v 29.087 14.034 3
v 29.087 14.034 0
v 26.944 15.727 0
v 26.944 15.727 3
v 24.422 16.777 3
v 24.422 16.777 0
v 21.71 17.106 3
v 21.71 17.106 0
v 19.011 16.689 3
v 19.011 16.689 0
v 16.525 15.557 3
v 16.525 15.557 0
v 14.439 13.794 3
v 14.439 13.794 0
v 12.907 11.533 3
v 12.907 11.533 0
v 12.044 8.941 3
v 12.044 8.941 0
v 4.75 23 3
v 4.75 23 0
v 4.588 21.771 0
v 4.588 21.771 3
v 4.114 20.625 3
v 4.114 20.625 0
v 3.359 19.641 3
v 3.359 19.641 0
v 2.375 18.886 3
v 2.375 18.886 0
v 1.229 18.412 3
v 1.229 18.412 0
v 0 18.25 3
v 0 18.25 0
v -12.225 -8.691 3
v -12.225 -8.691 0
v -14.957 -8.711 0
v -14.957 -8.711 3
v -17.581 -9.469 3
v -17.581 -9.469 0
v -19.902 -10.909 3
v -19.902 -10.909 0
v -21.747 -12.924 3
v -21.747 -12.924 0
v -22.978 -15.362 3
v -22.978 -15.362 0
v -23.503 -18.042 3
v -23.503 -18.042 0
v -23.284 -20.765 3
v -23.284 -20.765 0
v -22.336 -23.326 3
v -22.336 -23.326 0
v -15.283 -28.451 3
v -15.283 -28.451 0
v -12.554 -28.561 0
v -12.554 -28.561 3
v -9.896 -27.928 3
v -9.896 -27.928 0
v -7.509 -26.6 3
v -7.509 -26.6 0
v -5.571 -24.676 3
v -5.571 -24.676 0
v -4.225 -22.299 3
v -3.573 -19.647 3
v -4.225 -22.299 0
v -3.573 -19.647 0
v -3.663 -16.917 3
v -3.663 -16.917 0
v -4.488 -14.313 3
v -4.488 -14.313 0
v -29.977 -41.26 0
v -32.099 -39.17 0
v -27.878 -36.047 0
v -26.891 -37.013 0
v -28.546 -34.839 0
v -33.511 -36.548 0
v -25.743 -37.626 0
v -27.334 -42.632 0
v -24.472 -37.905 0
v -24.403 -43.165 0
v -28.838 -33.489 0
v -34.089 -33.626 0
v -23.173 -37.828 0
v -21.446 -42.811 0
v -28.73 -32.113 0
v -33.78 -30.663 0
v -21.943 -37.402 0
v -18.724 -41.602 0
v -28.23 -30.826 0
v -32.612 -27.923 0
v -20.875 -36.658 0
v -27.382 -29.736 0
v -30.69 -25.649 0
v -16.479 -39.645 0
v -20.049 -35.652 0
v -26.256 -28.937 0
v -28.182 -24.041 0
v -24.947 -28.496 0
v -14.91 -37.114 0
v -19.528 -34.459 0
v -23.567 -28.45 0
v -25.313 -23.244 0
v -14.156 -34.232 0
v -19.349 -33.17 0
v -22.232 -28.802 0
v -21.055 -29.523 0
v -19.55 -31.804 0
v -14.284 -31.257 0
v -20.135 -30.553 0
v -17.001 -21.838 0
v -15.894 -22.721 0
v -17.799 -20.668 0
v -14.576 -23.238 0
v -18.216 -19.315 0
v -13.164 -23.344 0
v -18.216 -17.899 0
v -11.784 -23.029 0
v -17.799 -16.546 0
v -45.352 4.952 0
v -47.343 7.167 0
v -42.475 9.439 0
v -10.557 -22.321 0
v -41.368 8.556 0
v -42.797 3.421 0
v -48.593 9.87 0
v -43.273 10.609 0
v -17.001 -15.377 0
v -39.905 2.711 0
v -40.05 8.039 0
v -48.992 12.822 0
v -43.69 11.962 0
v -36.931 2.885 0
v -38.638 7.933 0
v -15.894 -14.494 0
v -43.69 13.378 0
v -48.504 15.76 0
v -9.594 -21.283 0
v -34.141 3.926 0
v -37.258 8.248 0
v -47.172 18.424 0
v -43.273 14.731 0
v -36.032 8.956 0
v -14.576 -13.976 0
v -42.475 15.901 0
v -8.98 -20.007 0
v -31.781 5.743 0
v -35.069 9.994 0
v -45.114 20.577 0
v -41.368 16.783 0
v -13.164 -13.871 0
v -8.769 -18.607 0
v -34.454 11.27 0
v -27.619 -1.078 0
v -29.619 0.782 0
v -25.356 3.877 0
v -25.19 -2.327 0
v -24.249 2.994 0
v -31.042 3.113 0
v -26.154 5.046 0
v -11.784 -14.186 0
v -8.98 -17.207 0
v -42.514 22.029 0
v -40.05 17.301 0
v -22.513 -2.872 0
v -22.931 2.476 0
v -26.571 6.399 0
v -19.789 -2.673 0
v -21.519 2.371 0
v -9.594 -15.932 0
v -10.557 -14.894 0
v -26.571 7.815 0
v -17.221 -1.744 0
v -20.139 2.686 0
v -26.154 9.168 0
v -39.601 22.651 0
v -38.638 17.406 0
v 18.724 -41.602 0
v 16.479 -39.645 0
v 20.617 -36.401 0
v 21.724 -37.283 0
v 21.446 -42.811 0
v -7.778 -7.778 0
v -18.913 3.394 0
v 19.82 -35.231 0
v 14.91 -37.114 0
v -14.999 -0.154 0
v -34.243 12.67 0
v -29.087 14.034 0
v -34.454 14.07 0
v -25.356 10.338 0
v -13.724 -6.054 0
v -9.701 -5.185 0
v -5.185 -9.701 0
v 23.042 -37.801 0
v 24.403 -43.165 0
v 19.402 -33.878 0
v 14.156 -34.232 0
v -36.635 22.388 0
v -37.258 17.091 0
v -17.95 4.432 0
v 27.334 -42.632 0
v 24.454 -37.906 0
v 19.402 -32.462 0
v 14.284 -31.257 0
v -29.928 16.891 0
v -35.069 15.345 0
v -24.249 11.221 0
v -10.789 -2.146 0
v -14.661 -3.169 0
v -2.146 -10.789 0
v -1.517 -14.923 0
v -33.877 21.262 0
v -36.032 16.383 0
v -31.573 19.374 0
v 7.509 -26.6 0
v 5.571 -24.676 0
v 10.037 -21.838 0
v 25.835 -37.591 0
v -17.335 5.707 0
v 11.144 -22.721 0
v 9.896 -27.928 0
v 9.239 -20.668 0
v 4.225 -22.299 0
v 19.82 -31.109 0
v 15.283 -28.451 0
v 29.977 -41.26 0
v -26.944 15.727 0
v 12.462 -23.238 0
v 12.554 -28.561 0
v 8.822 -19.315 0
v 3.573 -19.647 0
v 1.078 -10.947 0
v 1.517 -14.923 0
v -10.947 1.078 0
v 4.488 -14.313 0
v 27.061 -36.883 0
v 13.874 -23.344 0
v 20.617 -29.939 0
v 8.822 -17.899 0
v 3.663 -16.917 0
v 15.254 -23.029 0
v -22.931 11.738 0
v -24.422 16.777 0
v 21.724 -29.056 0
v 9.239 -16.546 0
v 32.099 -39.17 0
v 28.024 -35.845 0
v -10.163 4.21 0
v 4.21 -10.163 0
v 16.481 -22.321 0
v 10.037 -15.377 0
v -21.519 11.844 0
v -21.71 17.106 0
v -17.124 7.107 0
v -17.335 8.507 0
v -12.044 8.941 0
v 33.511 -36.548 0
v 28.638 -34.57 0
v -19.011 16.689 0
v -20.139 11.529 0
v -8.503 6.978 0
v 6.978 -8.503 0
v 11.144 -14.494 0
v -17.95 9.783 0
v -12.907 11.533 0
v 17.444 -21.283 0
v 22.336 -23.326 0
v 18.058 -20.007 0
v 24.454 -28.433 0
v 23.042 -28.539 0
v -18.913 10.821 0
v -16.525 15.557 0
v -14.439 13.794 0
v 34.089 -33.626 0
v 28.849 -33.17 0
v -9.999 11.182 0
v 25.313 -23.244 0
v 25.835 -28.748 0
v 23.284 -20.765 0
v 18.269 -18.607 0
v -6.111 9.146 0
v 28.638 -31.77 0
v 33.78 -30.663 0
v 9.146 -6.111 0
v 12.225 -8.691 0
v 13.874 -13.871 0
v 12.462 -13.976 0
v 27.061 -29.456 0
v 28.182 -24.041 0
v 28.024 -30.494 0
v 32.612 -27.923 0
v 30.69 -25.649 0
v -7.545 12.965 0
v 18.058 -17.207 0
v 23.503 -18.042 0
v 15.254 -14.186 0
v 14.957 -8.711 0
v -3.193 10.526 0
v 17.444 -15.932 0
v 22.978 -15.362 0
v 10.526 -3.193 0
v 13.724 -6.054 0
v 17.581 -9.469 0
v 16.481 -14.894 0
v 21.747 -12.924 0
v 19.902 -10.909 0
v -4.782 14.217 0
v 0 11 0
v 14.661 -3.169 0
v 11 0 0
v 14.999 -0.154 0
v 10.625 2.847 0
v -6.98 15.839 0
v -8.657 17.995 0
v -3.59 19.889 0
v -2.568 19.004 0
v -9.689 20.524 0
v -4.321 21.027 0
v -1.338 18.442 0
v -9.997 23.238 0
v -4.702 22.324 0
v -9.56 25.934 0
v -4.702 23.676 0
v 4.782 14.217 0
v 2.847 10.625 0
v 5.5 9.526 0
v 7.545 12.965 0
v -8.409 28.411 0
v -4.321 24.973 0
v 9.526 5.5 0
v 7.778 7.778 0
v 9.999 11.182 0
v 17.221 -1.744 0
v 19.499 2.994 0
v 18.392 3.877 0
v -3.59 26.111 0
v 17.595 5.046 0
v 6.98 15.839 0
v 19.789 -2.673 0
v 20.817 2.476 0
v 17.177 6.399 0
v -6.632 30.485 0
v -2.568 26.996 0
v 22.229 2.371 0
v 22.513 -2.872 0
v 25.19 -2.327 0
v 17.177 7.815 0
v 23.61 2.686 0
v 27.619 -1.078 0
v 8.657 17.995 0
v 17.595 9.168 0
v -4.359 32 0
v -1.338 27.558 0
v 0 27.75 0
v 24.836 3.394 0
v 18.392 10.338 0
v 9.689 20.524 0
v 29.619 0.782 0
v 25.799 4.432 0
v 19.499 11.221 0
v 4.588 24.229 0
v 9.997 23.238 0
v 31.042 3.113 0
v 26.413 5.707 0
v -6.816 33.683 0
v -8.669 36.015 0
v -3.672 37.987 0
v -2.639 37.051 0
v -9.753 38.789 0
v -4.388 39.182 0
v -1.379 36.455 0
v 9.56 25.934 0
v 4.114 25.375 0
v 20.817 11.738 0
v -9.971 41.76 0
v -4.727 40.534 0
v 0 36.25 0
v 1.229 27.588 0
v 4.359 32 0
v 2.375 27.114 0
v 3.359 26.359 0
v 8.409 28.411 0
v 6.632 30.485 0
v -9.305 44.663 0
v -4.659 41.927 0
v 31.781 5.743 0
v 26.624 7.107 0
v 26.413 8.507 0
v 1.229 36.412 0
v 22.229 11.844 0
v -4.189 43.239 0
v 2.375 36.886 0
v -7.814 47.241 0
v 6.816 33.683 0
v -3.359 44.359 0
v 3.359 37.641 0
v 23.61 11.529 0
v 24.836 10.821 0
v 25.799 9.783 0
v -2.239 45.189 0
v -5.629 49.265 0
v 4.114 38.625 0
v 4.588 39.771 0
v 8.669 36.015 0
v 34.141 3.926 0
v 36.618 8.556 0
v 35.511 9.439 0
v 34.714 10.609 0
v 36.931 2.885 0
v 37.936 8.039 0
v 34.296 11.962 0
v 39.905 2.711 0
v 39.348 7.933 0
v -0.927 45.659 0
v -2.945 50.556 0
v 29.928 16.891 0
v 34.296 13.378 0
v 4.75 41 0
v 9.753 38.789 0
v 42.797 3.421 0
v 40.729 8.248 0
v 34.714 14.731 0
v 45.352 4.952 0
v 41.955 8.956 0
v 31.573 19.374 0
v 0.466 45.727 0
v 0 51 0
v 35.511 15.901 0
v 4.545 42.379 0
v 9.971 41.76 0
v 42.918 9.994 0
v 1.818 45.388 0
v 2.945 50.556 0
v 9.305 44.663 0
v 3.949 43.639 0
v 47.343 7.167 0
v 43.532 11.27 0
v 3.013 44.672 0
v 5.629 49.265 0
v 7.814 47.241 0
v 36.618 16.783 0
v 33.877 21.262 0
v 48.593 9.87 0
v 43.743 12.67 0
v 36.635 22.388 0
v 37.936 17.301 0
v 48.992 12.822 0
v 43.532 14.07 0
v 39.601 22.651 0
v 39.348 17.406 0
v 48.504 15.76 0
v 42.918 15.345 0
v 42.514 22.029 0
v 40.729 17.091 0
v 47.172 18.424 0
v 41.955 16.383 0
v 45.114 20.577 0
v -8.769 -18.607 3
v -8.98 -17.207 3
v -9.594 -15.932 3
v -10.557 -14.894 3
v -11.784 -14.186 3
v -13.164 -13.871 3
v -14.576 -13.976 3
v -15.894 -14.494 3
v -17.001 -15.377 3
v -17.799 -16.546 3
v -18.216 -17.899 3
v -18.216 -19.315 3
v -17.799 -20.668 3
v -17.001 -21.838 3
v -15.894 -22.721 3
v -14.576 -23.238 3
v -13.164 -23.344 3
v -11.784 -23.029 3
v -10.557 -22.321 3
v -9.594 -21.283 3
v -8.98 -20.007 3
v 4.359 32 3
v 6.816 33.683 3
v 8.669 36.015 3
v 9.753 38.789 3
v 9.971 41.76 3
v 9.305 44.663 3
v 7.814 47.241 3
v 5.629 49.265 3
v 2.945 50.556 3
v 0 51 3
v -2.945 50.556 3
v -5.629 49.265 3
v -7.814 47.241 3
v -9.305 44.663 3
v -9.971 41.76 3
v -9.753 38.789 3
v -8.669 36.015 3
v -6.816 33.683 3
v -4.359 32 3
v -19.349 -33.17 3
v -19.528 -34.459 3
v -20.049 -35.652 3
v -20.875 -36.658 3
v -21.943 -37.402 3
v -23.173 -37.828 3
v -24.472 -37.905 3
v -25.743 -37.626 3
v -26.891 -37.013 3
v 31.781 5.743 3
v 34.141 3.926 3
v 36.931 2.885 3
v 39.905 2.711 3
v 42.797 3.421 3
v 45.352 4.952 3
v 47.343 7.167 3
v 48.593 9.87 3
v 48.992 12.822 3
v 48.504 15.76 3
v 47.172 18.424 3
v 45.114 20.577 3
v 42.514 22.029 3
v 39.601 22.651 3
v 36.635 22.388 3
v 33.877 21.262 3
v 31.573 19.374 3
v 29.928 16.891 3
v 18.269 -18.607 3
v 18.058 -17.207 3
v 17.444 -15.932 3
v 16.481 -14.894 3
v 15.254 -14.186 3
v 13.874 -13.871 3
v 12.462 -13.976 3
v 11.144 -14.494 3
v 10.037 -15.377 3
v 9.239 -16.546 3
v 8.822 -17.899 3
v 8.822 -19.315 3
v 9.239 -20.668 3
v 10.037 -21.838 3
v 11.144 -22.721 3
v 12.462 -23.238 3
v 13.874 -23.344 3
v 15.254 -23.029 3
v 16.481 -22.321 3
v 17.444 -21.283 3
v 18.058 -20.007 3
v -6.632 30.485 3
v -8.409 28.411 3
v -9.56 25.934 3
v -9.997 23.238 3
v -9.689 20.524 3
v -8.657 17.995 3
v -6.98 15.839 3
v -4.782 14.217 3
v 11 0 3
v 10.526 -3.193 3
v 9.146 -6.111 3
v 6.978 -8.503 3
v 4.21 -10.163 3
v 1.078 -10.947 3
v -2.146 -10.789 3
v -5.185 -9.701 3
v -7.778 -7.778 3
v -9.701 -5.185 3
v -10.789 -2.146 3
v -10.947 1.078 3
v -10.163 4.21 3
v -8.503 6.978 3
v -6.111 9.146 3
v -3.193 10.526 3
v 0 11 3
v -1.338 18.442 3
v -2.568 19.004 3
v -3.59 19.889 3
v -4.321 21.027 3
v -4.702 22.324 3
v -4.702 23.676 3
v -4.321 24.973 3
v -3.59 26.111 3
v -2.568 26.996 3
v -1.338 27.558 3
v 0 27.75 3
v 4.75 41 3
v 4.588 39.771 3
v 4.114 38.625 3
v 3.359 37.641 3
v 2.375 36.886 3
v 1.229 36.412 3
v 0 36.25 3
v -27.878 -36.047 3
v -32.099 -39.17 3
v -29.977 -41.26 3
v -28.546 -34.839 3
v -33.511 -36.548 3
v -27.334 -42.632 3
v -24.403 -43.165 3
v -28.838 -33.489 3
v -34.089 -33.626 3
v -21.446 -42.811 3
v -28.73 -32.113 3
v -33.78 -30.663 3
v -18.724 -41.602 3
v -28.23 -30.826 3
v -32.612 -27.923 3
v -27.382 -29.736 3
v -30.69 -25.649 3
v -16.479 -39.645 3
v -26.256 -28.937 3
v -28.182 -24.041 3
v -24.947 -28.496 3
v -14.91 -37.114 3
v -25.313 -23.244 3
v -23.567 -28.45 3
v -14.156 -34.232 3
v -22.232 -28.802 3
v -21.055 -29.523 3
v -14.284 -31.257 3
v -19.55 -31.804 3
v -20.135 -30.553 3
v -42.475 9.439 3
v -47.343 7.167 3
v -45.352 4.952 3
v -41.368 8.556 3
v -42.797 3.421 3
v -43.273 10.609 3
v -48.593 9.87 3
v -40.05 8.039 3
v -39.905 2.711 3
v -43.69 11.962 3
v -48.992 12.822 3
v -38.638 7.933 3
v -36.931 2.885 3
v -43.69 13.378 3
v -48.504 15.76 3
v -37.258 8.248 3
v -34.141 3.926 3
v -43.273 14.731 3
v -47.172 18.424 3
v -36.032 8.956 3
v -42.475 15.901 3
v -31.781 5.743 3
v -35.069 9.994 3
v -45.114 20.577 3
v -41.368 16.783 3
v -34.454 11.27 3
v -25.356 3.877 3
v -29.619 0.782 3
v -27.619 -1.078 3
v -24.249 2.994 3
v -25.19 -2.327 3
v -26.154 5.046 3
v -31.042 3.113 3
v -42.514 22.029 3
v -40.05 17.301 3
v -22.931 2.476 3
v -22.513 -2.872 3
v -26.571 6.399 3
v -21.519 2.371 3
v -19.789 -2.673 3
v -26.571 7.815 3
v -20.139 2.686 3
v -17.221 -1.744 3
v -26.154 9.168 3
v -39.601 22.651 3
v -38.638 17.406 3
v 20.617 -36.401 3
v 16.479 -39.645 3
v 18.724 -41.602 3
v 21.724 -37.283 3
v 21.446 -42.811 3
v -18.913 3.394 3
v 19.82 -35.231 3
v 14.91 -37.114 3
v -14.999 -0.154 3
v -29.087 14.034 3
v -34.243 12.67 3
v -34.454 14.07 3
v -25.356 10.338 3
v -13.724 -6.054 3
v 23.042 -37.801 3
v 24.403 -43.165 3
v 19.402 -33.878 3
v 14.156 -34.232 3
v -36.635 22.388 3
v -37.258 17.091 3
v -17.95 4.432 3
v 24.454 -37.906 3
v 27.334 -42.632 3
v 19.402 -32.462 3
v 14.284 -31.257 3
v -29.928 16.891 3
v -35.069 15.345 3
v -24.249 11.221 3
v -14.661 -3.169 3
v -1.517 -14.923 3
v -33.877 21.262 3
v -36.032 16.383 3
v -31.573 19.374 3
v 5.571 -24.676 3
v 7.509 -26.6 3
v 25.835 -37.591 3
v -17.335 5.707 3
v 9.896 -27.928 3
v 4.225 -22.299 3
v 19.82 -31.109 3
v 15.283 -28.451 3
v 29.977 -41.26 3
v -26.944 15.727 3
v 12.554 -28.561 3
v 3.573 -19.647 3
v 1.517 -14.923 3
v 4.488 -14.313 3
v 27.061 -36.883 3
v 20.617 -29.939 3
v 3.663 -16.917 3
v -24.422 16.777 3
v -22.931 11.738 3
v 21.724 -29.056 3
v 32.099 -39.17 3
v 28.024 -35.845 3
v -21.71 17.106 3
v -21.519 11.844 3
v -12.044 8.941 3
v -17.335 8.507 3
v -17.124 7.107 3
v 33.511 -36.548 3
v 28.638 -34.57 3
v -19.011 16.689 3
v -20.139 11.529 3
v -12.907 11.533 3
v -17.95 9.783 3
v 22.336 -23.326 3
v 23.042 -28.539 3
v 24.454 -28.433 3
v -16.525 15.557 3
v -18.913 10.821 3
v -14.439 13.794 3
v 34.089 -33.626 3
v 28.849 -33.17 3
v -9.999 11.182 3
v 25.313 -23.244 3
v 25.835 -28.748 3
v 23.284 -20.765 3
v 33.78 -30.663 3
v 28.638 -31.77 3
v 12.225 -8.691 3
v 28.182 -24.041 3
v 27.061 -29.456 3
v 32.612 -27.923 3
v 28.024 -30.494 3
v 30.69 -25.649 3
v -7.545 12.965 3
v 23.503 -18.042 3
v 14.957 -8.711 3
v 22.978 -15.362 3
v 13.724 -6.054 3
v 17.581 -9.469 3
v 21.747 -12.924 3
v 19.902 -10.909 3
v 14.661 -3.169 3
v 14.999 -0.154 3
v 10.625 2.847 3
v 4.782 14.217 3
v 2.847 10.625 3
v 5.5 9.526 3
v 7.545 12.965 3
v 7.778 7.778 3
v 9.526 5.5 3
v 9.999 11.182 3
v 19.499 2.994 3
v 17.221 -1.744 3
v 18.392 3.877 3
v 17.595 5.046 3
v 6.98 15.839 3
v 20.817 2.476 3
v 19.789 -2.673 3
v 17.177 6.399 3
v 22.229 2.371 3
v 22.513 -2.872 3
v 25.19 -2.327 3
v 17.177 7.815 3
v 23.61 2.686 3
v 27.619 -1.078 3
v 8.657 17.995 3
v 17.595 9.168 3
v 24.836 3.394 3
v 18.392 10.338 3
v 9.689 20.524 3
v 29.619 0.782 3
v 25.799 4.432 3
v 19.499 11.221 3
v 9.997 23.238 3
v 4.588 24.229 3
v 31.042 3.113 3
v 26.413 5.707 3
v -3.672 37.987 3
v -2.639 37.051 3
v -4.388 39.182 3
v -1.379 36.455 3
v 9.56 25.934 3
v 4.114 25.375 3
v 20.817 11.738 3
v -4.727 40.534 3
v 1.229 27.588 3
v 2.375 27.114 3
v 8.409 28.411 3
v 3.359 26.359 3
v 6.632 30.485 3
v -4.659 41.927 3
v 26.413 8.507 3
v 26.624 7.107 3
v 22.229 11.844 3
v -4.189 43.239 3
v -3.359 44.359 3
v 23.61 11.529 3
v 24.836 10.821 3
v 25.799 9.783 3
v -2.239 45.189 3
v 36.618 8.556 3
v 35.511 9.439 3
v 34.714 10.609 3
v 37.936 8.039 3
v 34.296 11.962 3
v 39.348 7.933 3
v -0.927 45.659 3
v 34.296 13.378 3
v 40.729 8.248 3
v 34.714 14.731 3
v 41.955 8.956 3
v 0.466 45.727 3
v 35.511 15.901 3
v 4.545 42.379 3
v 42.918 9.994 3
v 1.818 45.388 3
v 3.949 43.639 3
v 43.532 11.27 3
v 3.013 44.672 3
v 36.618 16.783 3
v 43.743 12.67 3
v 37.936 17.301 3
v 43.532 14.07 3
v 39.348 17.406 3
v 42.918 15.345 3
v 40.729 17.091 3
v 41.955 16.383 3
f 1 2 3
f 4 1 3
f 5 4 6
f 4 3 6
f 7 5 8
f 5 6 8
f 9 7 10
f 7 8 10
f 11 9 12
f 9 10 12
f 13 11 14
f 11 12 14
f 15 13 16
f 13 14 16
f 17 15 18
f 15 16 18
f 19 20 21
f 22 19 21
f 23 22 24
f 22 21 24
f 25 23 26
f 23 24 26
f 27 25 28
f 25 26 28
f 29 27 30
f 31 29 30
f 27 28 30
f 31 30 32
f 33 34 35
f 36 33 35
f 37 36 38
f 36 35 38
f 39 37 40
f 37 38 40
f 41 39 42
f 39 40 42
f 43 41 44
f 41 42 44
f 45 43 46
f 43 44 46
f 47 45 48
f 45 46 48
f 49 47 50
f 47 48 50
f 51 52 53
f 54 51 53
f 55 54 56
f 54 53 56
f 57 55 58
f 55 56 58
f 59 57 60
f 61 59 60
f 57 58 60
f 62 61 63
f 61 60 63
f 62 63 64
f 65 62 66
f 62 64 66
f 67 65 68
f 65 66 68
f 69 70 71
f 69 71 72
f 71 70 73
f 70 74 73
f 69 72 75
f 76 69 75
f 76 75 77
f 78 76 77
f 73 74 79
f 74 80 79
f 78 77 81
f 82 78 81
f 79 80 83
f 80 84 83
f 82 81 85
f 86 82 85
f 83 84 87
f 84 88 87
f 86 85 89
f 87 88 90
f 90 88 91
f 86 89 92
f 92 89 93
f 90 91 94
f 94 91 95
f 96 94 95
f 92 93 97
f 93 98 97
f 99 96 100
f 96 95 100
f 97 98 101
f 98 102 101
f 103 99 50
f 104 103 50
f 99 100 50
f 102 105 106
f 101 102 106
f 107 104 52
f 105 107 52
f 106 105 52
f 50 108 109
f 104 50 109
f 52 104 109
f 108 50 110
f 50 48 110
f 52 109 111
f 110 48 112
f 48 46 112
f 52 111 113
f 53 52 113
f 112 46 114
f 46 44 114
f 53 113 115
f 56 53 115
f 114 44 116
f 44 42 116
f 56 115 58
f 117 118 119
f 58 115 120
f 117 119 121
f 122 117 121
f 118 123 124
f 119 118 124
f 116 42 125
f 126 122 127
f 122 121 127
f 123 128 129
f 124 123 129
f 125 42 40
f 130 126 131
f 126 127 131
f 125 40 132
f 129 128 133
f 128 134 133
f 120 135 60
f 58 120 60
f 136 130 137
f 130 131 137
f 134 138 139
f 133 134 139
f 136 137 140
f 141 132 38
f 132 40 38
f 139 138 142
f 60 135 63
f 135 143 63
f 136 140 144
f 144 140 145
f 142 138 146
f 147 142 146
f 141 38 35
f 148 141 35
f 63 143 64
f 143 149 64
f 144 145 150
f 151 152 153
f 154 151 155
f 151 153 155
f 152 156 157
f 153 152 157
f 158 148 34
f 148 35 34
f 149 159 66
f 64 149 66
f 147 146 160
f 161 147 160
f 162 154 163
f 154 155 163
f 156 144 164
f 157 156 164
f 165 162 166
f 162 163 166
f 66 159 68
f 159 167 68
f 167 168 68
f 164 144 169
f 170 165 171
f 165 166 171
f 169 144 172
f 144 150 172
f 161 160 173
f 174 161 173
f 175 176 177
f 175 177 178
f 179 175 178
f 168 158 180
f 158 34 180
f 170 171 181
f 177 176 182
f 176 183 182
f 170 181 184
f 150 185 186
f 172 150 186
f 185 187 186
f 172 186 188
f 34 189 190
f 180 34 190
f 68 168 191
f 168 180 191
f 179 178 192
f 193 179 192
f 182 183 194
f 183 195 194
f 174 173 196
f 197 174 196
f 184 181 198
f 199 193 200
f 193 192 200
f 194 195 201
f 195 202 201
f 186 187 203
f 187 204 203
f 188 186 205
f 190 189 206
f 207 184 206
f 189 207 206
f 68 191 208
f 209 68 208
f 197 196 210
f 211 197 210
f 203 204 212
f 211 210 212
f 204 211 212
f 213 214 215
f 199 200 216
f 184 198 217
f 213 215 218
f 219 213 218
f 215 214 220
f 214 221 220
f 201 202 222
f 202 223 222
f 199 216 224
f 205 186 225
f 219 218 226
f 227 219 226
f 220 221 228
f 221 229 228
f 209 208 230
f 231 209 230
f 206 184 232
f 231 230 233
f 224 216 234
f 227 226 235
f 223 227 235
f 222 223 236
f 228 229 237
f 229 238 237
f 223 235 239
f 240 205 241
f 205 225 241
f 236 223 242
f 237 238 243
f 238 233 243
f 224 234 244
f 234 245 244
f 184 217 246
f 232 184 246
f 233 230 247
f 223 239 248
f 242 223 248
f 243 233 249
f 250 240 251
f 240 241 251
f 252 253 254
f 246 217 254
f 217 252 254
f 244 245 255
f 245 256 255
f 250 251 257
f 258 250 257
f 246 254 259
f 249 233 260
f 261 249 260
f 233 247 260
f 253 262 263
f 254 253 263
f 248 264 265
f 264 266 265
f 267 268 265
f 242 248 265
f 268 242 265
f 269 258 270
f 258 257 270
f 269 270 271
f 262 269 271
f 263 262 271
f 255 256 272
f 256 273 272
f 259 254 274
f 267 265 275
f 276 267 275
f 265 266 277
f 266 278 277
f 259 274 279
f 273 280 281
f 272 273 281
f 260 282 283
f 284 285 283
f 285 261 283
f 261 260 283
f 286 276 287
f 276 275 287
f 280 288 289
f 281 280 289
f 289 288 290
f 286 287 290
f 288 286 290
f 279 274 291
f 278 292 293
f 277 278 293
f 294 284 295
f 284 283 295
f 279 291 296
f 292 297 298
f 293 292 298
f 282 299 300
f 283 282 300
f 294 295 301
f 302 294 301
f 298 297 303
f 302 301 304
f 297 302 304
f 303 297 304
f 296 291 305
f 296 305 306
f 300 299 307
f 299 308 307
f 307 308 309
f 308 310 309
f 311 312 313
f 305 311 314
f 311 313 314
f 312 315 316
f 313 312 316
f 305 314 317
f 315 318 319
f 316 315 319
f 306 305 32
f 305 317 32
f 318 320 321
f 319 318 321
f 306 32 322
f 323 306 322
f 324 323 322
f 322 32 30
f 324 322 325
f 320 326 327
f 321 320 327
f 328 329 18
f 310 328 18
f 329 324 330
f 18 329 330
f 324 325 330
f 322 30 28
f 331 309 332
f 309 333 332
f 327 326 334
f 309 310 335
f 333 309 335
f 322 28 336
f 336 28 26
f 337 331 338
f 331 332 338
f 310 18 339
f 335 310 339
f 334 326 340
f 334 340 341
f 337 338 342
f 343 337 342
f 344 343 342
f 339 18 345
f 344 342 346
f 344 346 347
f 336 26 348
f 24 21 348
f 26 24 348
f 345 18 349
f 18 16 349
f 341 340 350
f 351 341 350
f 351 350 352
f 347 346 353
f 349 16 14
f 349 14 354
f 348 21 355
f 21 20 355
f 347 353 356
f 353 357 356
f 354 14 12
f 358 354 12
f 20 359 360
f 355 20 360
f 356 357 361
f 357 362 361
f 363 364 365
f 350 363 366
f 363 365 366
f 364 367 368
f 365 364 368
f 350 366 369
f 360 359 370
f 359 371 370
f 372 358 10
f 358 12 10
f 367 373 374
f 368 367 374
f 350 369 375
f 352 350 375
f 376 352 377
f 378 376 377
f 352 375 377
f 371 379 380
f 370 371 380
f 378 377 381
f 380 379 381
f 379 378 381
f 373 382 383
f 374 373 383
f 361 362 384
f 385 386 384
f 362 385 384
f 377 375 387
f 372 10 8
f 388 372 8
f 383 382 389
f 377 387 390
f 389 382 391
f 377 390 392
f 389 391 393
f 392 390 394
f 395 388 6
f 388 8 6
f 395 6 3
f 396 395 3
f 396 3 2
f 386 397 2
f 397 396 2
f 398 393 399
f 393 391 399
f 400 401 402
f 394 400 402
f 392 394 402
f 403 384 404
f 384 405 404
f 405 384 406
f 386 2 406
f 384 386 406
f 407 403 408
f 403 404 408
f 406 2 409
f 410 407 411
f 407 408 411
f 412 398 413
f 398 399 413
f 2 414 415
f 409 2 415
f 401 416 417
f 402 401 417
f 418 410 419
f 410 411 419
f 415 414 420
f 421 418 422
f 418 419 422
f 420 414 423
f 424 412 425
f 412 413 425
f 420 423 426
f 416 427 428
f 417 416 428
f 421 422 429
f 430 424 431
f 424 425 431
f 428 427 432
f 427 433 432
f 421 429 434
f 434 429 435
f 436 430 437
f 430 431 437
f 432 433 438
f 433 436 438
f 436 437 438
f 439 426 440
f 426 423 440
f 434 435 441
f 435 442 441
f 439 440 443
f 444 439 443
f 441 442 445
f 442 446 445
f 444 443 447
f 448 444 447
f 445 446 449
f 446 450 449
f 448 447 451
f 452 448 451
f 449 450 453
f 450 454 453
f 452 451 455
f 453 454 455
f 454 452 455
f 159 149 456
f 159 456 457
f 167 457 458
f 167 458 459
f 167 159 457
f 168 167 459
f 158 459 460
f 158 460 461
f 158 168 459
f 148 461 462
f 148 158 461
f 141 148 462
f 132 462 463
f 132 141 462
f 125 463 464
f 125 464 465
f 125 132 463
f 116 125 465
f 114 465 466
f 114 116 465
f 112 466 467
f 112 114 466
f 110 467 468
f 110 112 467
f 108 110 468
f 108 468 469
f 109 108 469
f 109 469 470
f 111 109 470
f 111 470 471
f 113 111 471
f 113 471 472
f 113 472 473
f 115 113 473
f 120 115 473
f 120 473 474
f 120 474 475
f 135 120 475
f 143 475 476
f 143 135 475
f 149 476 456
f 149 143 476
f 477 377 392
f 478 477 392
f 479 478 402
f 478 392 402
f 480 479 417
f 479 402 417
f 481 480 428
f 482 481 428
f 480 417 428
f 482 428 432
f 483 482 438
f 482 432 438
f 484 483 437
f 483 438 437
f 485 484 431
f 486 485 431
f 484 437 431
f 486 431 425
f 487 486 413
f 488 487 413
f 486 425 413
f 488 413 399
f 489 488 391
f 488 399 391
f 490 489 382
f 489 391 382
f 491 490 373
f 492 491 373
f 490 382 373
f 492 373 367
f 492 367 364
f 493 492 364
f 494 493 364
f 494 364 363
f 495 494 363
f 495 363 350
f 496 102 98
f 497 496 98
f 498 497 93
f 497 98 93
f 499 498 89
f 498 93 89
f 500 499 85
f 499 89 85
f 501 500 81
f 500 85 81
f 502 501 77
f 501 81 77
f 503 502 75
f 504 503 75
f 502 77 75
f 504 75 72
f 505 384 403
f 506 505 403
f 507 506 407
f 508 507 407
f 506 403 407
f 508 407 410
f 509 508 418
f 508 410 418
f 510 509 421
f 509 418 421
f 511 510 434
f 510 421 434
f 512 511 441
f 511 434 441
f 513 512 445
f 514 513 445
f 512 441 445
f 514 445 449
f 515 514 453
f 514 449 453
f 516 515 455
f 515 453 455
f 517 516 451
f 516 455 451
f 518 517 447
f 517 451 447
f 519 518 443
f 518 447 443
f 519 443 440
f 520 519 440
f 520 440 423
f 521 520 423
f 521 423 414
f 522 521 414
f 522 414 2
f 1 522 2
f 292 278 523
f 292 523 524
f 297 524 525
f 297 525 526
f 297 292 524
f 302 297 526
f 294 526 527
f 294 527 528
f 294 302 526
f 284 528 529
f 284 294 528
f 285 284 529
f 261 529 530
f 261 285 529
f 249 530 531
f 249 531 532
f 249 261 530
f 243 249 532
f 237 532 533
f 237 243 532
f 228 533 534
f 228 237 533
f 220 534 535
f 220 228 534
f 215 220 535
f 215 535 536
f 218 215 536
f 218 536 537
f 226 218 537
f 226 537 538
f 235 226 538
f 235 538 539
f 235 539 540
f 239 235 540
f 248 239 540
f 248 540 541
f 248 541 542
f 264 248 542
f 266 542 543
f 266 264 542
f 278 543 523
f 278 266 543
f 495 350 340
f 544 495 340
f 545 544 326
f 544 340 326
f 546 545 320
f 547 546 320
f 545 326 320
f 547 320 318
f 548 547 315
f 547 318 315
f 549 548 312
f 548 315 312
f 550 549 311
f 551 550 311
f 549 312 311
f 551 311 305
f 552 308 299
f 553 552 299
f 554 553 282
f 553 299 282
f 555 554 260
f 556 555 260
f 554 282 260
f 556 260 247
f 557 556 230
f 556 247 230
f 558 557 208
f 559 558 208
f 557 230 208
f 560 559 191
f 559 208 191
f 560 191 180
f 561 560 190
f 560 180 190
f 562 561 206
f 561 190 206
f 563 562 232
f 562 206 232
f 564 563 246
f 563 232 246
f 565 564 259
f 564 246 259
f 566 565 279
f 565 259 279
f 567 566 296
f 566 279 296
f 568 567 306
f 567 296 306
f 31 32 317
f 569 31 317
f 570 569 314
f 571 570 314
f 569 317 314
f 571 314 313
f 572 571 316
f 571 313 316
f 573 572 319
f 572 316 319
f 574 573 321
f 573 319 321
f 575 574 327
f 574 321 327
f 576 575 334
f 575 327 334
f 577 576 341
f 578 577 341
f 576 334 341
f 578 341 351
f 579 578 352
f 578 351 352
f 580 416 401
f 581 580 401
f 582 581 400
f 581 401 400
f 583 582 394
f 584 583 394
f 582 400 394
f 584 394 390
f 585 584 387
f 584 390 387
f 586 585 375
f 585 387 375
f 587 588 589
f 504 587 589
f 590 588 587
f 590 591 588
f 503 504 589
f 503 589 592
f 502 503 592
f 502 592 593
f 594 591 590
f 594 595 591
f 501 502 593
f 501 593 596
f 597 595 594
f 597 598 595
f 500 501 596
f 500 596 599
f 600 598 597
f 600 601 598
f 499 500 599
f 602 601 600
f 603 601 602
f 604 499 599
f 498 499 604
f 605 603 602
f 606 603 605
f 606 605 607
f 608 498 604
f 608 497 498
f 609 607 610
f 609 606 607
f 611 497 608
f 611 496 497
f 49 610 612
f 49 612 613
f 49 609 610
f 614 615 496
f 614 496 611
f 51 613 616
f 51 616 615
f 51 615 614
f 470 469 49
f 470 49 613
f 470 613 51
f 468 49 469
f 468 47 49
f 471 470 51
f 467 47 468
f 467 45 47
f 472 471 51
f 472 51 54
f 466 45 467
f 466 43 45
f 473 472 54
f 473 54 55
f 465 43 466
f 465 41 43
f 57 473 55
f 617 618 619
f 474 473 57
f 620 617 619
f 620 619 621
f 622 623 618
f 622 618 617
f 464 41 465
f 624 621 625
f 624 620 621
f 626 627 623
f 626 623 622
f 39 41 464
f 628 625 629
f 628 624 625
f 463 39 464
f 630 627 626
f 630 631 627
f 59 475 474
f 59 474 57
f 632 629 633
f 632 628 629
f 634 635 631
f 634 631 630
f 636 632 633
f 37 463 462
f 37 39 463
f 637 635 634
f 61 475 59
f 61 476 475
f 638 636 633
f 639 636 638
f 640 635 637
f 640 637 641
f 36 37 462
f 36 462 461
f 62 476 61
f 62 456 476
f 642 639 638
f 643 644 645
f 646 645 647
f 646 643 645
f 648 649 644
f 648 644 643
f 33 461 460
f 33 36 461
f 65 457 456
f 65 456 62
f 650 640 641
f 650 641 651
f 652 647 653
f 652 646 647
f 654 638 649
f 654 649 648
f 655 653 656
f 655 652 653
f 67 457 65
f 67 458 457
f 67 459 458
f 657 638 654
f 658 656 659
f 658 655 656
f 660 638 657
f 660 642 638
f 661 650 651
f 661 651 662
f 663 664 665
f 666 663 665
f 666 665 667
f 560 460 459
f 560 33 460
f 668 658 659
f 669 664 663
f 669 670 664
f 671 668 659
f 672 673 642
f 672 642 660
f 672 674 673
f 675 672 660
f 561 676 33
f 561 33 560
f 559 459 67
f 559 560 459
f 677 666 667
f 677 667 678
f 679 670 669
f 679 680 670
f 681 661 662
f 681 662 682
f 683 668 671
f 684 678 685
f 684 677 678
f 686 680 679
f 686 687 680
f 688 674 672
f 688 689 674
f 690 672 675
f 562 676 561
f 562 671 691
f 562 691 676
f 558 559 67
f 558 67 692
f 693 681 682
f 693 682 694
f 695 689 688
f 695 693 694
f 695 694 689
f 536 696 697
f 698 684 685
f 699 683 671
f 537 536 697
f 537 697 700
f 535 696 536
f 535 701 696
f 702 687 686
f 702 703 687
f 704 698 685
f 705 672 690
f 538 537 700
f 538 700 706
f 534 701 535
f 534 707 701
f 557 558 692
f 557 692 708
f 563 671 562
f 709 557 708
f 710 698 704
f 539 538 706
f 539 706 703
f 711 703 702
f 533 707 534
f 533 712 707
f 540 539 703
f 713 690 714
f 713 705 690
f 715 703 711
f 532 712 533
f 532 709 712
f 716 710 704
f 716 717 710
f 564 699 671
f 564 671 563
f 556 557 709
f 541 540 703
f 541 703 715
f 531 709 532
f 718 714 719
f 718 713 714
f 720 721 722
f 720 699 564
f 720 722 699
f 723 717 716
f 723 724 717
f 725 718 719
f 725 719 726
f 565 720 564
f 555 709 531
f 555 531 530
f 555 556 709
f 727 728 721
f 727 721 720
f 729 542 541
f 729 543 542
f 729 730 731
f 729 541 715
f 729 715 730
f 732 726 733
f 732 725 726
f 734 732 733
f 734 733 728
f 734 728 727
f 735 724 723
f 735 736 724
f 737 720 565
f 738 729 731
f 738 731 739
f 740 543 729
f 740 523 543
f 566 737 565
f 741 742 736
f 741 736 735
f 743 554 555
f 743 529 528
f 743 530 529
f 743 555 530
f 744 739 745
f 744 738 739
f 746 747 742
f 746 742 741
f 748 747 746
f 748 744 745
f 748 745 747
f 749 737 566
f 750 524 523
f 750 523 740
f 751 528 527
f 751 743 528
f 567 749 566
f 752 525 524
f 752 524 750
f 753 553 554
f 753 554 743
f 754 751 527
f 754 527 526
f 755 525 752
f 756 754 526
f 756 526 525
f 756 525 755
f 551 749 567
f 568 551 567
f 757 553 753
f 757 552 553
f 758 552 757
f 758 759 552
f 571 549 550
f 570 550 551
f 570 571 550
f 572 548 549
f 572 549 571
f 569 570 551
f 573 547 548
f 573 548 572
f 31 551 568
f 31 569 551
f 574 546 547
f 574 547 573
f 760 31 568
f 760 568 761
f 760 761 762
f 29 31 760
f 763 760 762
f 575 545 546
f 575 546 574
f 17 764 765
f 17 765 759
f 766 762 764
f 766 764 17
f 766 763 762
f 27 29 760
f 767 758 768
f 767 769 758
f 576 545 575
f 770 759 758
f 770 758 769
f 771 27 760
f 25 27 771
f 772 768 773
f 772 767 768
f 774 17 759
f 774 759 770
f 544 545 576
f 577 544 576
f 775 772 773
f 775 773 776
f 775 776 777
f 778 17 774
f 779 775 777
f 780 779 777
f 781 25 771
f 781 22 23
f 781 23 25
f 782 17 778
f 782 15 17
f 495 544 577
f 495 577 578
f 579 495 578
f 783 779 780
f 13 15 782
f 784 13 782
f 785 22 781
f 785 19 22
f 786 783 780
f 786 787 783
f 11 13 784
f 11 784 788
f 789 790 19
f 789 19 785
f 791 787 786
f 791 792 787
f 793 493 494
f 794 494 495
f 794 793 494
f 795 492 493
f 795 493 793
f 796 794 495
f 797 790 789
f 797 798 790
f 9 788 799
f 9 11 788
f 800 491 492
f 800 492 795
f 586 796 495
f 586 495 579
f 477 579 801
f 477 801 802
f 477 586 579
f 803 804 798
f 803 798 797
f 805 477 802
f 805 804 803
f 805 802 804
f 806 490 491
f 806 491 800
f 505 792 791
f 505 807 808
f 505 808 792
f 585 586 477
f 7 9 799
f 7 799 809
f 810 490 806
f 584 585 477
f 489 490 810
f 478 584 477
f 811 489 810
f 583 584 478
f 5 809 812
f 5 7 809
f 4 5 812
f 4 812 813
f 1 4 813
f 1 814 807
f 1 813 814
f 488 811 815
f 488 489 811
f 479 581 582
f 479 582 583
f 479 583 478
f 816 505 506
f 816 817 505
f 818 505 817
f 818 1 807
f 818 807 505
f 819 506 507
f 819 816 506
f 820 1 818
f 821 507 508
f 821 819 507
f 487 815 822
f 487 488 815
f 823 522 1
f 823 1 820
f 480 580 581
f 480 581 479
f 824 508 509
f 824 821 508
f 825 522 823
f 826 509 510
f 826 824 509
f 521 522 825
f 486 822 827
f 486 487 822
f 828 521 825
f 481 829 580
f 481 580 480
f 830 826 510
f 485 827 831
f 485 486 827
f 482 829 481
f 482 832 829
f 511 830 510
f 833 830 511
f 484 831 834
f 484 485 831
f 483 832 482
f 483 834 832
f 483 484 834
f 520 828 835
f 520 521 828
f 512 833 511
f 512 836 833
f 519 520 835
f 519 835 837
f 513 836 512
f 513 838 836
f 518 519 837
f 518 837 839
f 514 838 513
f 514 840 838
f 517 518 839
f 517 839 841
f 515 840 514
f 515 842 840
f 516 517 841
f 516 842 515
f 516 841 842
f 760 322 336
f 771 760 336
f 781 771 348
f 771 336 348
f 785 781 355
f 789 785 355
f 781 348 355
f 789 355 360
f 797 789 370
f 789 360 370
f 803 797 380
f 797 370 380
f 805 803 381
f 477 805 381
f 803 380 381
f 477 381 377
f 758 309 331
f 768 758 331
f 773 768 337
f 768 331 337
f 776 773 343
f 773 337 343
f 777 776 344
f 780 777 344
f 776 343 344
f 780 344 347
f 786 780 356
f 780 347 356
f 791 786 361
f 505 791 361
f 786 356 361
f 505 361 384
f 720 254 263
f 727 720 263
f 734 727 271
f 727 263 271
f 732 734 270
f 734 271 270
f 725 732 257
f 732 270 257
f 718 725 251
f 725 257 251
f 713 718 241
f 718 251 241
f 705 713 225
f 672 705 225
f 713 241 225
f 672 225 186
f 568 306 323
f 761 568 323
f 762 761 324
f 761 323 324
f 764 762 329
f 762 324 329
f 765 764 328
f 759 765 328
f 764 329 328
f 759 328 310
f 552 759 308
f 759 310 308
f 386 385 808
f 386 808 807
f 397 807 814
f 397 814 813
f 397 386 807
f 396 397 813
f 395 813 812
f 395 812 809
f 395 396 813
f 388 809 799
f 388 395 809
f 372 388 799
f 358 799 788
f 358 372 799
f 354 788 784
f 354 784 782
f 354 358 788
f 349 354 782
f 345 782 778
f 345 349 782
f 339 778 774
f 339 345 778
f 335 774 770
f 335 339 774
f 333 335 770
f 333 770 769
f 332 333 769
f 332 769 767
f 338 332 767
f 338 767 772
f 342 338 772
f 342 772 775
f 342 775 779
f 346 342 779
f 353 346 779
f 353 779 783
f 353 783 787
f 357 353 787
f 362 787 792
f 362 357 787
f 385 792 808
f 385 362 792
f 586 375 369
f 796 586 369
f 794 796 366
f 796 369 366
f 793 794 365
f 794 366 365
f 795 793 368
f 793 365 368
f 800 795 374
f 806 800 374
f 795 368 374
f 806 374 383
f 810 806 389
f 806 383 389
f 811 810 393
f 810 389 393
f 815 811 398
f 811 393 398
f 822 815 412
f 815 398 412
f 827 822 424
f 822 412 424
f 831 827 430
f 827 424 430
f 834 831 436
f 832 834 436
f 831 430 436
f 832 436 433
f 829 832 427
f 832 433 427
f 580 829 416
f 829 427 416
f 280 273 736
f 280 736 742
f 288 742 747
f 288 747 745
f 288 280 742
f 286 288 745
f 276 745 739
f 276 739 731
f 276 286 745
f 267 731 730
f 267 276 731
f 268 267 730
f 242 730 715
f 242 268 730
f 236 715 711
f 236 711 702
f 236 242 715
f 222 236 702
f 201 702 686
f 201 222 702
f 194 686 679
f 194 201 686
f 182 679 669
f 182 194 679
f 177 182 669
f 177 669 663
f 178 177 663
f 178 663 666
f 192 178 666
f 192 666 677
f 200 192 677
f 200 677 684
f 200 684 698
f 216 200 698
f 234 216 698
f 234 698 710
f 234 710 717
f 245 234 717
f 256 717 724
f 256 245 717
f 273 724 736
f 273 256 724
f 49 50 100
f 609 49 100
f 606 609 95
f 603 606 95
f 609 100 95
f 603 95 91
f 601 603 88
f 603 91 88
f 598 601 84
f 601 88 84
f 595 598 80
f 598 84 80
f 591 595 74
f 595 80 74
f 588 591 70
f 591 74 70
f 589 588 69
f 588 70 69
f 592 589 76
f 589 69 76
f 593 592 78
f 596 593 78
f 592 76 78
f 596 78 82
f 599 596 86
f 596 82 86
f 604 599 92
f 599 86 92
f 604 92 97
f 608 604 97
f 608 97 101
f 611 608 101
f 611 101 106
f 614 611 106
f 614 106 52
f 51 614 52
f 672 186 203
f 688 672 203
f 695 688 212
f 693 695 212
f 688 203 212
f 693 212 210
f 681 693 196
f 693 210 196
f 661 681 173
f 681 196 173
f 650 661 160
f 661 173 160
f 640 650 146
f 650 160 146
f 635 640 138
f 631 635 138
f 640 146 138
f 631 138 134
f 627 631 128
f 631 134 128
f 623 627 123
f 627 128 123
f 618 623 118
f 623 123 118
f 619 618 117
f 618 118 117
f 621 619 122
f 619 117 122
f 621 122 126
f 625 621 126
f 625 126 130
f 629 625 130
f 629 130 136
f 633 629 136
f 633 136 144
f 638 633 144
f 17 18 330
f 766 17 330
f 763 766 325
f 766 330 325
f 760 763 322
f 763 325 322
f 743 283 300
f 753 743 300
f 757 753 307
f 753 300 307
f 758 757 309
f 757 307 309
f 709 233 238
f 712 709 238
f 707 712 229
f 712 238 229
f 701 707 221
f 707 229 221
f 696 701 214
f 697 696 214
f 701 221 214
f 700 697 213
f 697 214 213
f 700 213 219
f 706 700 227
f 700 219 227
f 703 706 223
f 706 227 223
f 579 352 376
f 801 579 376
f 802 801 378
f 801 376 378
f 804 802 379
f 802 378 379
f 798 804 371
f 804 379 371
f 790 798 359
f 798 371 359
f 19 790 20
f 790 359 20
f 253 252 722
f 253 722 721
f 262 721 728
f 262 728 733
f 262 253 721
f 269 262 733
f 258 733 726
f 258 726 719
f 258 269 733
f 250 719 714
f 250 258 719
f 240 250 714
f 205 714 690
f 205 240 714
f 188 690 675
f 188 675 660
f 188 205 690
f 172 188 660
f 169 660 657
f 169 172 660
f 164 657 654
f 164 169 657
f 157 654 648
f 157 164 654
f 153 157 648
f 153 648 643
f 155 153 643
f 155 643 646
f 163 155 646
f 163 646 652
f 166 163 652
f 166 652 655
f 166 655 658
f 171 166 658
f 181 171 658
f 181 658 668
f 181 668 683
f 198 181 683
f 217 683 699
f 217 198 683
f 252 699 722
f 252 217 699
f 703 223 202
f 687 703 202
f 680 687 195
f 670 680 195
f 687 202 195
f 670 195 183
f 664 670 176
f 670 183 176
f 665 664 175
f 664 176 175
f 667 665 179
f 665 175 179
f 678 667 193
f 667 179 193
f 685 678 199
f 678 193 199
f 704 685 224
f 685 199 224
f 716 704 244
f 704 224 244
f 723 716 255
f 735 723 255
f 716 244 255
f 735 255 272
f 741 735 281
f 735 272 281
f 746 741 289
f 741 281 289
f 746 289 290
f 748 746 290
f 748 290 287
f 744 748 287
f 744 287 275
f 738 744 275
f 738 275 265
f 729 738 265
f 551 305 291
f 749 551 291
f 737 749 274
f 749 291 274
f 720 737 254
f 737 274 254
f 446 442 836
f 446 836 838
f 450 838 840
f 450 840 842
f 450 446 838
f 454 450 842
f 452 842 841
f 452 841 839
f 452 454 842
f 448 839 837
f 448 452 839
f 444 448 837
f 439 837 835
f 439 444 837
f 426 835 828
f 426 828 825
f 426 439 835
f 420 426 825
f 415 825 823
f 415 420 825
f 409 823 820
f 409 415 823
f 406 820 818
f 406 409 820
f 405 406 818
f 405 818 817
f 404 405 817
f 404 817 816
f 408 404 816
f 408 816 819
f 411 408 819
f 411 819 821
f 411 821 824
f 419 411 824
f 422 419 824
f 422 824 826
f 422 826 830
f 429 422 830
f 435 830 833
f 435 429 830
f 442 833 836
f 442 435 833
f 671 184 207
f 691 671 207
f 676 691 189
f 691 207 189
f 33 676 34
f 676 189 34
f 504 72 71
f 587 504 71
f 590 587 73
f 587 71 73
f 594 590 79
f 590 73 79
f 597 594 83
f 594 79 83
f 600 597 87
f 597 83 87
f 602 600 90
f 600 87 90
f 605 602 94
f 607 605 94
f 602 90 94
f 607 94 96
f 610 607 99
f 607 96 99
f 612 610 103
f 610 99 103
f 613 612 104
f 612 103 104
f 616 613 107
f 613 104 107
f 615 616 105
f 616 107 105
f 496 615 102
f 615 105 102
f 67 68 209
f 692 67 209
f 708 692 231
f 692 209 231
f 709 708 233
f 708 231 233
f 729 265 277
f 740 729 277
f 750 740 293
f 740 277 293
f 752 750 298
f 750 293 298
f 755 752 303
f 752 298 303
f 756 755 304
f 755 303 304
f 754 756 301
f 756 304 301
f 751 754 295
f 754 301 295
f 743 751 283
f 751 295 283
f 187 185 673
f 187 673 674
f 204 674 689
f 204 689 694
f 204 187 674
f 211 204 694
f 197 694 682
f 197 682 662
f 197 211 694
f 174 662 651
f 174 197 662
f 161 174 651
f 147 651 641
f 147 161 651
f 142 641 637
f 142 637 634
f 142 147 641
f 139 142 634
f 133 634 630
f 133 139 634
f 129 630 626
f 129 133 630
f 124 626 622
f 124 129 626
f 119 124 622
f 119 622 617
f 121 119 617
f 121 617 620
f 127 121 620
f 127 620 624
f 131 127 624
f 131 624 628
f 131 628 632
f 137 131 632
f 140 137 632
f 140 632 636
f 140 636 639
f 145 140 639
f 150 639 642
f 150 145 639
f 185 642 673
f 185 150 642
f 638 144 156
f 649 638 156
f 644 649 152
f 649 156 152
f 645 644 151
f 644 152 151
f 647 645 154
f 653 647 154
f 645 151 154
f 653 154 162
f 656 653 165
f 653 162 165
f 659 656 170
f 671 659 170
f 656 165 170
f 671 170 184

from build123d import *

# Parameters (mm, degrees)
F0_R     = 4.75
F1_DEPTH = 3


with BuildPart() as f1:
    # F0 (on Top) → F1 (new body)
    with BuildSketch(Plane.XY):
        with BuildLine():
            ThreePointArc((0, 11), (-7.778175, -7.778175), (11, 0))
            ThreePointArc((11, 0), (7.778175, 7.778175), (0, 11))
        make_face()
        with BuildLine():
            ThreePointArc((4.75, 41), (-3.358757, 44.358757), (0, 36.25))
            ThreePointArc((0, 36.25), (3.358757, 37.641243), (4.75, 41))
        make_face()
        with BuildLine():
            ThreePointArc((-4.358899, 32), (-9.997173, 23.23776), (-4.781818, 14.217391))
            ThreePointArc((-4.781818, 14.217391), (-8.816779, 12.135255), (-12.04388, 8.941195))
            ThreePointArc((-12.04388, 8.941195), (-19.011127, 16.688739), (-29.086835, 14.034103))
            ThreePointArc((-29.086835, 14.034103), (-48.503882, 15.759867), (-31.780782, 5.742985))
            ThreePointArc((-31.780782, 5.742985), (-25.18972, -2.327014), (-14.999206, -0.154364))
            ThreePointArc((-14.999206, -0.154364), (-14.265848, -4.635255), (-12.225345, -8.691429))
            ThreePointArc((-12.225345, -8.691429), (-21.746696, -12.923552), (-22.335551, -23.326447))
            ThreePointArc((-22.335551, -23.326447), (-29.977048, -41.259867), (-15.282705, -28.45064))
            ThreePointArc((-15.282705, -28.45064), (-5.57093, -24.675934), (-4.488201, -14.312793))
            ThreePointArc((-4.488201, -14.312793), (0, -15), (4.488201, -14.312793))
            ThreePointArc((4.488201, -14.312793), (5.57093, -24.675934), (15.282705, -28.45064))
            ThreePointArc((15.282705, -28.45064), (29.977048, -41.259867), (22.335551, -23.326447))
            ThreePointArc((22.335551, -23.326447), (21.746696, -12.923552), (12.225345, -8.691429))
            ThreePointArc((12.225345, -8.691429), (14.265848, -4.635255), (14.999206, -0.154364))
            ThreePointArc((14.999206, -0.154364), (25.18972, -2.327014), (31.780782, 5.742985))
            ThreePointArc((31.780782, 5.742985), (48.503882, 15.759867), (29.086835, 14.034103))
            ThreePointArc((29.086835, 14.034103), (19.011127, 16.688739), (12.04388, 8.941195))
            ThreePointArc((12.04388, 8.941195), (8.816779, 12.135255), (4.781818, 14.217391))
            ThreePointArc((4.781818, 14.217391), (9.997173, 23.23776), (4.358899, 32))
            ThreePointArc((4.358899, 32), (0, 51), (-4.358899, 32))
        make_face()
        with BuildLine():
            ThreePointArc((-26.891175, -37.012527), (-26.25565, -28.937416), (-19.349195, -33.169697))
            ThreePointArc((-19.349195, -33.169697), (-21.94274, -37.401978), (-26.891175, -37.012527))
        make_face(mode=Mode.SUBTRACT)
        with Locations((-13.519061, -18.607391)):
            Circle(F0_R, mode=Mode.SUBTRACT)
        with BuildLine():
            ThreePointArc((0, 11), (7.778175, 7.778175), (11, 0))
            ThreePointArc((11, 0), (-7.778175, -7.778175), (0, 11))
        make_face(mode=Mode.SUBTRACT)
        with Locations((24.099195, -33.169697)):
            Circle(F0_R, mode=Mode.SUBTRACT)
        with Locations((13.519061, -18.607391)):
            Circle(F0_R, mode=Mode.SUBTRACT)
        with Locations((-38.993317, 12.669697)):
            Circle(F0_R, mode=Mode.SUBTRACT)
        with Locations((-21.8743, 7.107391)):
            Circle(F0_R, mode=Mode.SUBTRACT)
        with BuildLine():
            ThreePointArc((4.75, 23), (3.358757, 19.641243), (0, 18.25))
            ThreePointArc((0, 18.25), (-4.75, 23), (0, 27.75))
            ThreePointArc((0, 27.75), (3.358757, 26.358757), (4.75, 23))
        make_face(mode=Mode.SUBTRACT)
        with BuildLine():
            ThreePointArc((4.75, 41), (3.358757, 37.641243), (0, 36.25))
            ThreePointArc((0, 36.25), (-3.358757, 44.358757), (4.75, 41))
        make_face(mode=Mode.SUBTRACT)
        with Locations((21.8743, 7.107391)):
            Circle(F0_R, mode=Mode.SUBTRACT)
        with Locations((38.993317, 12.669697)):
            Circle(F0_R, mode=Mode.SUBTRACT)
    extrude(amount=F1_DEPTH)


solid = f1.part
